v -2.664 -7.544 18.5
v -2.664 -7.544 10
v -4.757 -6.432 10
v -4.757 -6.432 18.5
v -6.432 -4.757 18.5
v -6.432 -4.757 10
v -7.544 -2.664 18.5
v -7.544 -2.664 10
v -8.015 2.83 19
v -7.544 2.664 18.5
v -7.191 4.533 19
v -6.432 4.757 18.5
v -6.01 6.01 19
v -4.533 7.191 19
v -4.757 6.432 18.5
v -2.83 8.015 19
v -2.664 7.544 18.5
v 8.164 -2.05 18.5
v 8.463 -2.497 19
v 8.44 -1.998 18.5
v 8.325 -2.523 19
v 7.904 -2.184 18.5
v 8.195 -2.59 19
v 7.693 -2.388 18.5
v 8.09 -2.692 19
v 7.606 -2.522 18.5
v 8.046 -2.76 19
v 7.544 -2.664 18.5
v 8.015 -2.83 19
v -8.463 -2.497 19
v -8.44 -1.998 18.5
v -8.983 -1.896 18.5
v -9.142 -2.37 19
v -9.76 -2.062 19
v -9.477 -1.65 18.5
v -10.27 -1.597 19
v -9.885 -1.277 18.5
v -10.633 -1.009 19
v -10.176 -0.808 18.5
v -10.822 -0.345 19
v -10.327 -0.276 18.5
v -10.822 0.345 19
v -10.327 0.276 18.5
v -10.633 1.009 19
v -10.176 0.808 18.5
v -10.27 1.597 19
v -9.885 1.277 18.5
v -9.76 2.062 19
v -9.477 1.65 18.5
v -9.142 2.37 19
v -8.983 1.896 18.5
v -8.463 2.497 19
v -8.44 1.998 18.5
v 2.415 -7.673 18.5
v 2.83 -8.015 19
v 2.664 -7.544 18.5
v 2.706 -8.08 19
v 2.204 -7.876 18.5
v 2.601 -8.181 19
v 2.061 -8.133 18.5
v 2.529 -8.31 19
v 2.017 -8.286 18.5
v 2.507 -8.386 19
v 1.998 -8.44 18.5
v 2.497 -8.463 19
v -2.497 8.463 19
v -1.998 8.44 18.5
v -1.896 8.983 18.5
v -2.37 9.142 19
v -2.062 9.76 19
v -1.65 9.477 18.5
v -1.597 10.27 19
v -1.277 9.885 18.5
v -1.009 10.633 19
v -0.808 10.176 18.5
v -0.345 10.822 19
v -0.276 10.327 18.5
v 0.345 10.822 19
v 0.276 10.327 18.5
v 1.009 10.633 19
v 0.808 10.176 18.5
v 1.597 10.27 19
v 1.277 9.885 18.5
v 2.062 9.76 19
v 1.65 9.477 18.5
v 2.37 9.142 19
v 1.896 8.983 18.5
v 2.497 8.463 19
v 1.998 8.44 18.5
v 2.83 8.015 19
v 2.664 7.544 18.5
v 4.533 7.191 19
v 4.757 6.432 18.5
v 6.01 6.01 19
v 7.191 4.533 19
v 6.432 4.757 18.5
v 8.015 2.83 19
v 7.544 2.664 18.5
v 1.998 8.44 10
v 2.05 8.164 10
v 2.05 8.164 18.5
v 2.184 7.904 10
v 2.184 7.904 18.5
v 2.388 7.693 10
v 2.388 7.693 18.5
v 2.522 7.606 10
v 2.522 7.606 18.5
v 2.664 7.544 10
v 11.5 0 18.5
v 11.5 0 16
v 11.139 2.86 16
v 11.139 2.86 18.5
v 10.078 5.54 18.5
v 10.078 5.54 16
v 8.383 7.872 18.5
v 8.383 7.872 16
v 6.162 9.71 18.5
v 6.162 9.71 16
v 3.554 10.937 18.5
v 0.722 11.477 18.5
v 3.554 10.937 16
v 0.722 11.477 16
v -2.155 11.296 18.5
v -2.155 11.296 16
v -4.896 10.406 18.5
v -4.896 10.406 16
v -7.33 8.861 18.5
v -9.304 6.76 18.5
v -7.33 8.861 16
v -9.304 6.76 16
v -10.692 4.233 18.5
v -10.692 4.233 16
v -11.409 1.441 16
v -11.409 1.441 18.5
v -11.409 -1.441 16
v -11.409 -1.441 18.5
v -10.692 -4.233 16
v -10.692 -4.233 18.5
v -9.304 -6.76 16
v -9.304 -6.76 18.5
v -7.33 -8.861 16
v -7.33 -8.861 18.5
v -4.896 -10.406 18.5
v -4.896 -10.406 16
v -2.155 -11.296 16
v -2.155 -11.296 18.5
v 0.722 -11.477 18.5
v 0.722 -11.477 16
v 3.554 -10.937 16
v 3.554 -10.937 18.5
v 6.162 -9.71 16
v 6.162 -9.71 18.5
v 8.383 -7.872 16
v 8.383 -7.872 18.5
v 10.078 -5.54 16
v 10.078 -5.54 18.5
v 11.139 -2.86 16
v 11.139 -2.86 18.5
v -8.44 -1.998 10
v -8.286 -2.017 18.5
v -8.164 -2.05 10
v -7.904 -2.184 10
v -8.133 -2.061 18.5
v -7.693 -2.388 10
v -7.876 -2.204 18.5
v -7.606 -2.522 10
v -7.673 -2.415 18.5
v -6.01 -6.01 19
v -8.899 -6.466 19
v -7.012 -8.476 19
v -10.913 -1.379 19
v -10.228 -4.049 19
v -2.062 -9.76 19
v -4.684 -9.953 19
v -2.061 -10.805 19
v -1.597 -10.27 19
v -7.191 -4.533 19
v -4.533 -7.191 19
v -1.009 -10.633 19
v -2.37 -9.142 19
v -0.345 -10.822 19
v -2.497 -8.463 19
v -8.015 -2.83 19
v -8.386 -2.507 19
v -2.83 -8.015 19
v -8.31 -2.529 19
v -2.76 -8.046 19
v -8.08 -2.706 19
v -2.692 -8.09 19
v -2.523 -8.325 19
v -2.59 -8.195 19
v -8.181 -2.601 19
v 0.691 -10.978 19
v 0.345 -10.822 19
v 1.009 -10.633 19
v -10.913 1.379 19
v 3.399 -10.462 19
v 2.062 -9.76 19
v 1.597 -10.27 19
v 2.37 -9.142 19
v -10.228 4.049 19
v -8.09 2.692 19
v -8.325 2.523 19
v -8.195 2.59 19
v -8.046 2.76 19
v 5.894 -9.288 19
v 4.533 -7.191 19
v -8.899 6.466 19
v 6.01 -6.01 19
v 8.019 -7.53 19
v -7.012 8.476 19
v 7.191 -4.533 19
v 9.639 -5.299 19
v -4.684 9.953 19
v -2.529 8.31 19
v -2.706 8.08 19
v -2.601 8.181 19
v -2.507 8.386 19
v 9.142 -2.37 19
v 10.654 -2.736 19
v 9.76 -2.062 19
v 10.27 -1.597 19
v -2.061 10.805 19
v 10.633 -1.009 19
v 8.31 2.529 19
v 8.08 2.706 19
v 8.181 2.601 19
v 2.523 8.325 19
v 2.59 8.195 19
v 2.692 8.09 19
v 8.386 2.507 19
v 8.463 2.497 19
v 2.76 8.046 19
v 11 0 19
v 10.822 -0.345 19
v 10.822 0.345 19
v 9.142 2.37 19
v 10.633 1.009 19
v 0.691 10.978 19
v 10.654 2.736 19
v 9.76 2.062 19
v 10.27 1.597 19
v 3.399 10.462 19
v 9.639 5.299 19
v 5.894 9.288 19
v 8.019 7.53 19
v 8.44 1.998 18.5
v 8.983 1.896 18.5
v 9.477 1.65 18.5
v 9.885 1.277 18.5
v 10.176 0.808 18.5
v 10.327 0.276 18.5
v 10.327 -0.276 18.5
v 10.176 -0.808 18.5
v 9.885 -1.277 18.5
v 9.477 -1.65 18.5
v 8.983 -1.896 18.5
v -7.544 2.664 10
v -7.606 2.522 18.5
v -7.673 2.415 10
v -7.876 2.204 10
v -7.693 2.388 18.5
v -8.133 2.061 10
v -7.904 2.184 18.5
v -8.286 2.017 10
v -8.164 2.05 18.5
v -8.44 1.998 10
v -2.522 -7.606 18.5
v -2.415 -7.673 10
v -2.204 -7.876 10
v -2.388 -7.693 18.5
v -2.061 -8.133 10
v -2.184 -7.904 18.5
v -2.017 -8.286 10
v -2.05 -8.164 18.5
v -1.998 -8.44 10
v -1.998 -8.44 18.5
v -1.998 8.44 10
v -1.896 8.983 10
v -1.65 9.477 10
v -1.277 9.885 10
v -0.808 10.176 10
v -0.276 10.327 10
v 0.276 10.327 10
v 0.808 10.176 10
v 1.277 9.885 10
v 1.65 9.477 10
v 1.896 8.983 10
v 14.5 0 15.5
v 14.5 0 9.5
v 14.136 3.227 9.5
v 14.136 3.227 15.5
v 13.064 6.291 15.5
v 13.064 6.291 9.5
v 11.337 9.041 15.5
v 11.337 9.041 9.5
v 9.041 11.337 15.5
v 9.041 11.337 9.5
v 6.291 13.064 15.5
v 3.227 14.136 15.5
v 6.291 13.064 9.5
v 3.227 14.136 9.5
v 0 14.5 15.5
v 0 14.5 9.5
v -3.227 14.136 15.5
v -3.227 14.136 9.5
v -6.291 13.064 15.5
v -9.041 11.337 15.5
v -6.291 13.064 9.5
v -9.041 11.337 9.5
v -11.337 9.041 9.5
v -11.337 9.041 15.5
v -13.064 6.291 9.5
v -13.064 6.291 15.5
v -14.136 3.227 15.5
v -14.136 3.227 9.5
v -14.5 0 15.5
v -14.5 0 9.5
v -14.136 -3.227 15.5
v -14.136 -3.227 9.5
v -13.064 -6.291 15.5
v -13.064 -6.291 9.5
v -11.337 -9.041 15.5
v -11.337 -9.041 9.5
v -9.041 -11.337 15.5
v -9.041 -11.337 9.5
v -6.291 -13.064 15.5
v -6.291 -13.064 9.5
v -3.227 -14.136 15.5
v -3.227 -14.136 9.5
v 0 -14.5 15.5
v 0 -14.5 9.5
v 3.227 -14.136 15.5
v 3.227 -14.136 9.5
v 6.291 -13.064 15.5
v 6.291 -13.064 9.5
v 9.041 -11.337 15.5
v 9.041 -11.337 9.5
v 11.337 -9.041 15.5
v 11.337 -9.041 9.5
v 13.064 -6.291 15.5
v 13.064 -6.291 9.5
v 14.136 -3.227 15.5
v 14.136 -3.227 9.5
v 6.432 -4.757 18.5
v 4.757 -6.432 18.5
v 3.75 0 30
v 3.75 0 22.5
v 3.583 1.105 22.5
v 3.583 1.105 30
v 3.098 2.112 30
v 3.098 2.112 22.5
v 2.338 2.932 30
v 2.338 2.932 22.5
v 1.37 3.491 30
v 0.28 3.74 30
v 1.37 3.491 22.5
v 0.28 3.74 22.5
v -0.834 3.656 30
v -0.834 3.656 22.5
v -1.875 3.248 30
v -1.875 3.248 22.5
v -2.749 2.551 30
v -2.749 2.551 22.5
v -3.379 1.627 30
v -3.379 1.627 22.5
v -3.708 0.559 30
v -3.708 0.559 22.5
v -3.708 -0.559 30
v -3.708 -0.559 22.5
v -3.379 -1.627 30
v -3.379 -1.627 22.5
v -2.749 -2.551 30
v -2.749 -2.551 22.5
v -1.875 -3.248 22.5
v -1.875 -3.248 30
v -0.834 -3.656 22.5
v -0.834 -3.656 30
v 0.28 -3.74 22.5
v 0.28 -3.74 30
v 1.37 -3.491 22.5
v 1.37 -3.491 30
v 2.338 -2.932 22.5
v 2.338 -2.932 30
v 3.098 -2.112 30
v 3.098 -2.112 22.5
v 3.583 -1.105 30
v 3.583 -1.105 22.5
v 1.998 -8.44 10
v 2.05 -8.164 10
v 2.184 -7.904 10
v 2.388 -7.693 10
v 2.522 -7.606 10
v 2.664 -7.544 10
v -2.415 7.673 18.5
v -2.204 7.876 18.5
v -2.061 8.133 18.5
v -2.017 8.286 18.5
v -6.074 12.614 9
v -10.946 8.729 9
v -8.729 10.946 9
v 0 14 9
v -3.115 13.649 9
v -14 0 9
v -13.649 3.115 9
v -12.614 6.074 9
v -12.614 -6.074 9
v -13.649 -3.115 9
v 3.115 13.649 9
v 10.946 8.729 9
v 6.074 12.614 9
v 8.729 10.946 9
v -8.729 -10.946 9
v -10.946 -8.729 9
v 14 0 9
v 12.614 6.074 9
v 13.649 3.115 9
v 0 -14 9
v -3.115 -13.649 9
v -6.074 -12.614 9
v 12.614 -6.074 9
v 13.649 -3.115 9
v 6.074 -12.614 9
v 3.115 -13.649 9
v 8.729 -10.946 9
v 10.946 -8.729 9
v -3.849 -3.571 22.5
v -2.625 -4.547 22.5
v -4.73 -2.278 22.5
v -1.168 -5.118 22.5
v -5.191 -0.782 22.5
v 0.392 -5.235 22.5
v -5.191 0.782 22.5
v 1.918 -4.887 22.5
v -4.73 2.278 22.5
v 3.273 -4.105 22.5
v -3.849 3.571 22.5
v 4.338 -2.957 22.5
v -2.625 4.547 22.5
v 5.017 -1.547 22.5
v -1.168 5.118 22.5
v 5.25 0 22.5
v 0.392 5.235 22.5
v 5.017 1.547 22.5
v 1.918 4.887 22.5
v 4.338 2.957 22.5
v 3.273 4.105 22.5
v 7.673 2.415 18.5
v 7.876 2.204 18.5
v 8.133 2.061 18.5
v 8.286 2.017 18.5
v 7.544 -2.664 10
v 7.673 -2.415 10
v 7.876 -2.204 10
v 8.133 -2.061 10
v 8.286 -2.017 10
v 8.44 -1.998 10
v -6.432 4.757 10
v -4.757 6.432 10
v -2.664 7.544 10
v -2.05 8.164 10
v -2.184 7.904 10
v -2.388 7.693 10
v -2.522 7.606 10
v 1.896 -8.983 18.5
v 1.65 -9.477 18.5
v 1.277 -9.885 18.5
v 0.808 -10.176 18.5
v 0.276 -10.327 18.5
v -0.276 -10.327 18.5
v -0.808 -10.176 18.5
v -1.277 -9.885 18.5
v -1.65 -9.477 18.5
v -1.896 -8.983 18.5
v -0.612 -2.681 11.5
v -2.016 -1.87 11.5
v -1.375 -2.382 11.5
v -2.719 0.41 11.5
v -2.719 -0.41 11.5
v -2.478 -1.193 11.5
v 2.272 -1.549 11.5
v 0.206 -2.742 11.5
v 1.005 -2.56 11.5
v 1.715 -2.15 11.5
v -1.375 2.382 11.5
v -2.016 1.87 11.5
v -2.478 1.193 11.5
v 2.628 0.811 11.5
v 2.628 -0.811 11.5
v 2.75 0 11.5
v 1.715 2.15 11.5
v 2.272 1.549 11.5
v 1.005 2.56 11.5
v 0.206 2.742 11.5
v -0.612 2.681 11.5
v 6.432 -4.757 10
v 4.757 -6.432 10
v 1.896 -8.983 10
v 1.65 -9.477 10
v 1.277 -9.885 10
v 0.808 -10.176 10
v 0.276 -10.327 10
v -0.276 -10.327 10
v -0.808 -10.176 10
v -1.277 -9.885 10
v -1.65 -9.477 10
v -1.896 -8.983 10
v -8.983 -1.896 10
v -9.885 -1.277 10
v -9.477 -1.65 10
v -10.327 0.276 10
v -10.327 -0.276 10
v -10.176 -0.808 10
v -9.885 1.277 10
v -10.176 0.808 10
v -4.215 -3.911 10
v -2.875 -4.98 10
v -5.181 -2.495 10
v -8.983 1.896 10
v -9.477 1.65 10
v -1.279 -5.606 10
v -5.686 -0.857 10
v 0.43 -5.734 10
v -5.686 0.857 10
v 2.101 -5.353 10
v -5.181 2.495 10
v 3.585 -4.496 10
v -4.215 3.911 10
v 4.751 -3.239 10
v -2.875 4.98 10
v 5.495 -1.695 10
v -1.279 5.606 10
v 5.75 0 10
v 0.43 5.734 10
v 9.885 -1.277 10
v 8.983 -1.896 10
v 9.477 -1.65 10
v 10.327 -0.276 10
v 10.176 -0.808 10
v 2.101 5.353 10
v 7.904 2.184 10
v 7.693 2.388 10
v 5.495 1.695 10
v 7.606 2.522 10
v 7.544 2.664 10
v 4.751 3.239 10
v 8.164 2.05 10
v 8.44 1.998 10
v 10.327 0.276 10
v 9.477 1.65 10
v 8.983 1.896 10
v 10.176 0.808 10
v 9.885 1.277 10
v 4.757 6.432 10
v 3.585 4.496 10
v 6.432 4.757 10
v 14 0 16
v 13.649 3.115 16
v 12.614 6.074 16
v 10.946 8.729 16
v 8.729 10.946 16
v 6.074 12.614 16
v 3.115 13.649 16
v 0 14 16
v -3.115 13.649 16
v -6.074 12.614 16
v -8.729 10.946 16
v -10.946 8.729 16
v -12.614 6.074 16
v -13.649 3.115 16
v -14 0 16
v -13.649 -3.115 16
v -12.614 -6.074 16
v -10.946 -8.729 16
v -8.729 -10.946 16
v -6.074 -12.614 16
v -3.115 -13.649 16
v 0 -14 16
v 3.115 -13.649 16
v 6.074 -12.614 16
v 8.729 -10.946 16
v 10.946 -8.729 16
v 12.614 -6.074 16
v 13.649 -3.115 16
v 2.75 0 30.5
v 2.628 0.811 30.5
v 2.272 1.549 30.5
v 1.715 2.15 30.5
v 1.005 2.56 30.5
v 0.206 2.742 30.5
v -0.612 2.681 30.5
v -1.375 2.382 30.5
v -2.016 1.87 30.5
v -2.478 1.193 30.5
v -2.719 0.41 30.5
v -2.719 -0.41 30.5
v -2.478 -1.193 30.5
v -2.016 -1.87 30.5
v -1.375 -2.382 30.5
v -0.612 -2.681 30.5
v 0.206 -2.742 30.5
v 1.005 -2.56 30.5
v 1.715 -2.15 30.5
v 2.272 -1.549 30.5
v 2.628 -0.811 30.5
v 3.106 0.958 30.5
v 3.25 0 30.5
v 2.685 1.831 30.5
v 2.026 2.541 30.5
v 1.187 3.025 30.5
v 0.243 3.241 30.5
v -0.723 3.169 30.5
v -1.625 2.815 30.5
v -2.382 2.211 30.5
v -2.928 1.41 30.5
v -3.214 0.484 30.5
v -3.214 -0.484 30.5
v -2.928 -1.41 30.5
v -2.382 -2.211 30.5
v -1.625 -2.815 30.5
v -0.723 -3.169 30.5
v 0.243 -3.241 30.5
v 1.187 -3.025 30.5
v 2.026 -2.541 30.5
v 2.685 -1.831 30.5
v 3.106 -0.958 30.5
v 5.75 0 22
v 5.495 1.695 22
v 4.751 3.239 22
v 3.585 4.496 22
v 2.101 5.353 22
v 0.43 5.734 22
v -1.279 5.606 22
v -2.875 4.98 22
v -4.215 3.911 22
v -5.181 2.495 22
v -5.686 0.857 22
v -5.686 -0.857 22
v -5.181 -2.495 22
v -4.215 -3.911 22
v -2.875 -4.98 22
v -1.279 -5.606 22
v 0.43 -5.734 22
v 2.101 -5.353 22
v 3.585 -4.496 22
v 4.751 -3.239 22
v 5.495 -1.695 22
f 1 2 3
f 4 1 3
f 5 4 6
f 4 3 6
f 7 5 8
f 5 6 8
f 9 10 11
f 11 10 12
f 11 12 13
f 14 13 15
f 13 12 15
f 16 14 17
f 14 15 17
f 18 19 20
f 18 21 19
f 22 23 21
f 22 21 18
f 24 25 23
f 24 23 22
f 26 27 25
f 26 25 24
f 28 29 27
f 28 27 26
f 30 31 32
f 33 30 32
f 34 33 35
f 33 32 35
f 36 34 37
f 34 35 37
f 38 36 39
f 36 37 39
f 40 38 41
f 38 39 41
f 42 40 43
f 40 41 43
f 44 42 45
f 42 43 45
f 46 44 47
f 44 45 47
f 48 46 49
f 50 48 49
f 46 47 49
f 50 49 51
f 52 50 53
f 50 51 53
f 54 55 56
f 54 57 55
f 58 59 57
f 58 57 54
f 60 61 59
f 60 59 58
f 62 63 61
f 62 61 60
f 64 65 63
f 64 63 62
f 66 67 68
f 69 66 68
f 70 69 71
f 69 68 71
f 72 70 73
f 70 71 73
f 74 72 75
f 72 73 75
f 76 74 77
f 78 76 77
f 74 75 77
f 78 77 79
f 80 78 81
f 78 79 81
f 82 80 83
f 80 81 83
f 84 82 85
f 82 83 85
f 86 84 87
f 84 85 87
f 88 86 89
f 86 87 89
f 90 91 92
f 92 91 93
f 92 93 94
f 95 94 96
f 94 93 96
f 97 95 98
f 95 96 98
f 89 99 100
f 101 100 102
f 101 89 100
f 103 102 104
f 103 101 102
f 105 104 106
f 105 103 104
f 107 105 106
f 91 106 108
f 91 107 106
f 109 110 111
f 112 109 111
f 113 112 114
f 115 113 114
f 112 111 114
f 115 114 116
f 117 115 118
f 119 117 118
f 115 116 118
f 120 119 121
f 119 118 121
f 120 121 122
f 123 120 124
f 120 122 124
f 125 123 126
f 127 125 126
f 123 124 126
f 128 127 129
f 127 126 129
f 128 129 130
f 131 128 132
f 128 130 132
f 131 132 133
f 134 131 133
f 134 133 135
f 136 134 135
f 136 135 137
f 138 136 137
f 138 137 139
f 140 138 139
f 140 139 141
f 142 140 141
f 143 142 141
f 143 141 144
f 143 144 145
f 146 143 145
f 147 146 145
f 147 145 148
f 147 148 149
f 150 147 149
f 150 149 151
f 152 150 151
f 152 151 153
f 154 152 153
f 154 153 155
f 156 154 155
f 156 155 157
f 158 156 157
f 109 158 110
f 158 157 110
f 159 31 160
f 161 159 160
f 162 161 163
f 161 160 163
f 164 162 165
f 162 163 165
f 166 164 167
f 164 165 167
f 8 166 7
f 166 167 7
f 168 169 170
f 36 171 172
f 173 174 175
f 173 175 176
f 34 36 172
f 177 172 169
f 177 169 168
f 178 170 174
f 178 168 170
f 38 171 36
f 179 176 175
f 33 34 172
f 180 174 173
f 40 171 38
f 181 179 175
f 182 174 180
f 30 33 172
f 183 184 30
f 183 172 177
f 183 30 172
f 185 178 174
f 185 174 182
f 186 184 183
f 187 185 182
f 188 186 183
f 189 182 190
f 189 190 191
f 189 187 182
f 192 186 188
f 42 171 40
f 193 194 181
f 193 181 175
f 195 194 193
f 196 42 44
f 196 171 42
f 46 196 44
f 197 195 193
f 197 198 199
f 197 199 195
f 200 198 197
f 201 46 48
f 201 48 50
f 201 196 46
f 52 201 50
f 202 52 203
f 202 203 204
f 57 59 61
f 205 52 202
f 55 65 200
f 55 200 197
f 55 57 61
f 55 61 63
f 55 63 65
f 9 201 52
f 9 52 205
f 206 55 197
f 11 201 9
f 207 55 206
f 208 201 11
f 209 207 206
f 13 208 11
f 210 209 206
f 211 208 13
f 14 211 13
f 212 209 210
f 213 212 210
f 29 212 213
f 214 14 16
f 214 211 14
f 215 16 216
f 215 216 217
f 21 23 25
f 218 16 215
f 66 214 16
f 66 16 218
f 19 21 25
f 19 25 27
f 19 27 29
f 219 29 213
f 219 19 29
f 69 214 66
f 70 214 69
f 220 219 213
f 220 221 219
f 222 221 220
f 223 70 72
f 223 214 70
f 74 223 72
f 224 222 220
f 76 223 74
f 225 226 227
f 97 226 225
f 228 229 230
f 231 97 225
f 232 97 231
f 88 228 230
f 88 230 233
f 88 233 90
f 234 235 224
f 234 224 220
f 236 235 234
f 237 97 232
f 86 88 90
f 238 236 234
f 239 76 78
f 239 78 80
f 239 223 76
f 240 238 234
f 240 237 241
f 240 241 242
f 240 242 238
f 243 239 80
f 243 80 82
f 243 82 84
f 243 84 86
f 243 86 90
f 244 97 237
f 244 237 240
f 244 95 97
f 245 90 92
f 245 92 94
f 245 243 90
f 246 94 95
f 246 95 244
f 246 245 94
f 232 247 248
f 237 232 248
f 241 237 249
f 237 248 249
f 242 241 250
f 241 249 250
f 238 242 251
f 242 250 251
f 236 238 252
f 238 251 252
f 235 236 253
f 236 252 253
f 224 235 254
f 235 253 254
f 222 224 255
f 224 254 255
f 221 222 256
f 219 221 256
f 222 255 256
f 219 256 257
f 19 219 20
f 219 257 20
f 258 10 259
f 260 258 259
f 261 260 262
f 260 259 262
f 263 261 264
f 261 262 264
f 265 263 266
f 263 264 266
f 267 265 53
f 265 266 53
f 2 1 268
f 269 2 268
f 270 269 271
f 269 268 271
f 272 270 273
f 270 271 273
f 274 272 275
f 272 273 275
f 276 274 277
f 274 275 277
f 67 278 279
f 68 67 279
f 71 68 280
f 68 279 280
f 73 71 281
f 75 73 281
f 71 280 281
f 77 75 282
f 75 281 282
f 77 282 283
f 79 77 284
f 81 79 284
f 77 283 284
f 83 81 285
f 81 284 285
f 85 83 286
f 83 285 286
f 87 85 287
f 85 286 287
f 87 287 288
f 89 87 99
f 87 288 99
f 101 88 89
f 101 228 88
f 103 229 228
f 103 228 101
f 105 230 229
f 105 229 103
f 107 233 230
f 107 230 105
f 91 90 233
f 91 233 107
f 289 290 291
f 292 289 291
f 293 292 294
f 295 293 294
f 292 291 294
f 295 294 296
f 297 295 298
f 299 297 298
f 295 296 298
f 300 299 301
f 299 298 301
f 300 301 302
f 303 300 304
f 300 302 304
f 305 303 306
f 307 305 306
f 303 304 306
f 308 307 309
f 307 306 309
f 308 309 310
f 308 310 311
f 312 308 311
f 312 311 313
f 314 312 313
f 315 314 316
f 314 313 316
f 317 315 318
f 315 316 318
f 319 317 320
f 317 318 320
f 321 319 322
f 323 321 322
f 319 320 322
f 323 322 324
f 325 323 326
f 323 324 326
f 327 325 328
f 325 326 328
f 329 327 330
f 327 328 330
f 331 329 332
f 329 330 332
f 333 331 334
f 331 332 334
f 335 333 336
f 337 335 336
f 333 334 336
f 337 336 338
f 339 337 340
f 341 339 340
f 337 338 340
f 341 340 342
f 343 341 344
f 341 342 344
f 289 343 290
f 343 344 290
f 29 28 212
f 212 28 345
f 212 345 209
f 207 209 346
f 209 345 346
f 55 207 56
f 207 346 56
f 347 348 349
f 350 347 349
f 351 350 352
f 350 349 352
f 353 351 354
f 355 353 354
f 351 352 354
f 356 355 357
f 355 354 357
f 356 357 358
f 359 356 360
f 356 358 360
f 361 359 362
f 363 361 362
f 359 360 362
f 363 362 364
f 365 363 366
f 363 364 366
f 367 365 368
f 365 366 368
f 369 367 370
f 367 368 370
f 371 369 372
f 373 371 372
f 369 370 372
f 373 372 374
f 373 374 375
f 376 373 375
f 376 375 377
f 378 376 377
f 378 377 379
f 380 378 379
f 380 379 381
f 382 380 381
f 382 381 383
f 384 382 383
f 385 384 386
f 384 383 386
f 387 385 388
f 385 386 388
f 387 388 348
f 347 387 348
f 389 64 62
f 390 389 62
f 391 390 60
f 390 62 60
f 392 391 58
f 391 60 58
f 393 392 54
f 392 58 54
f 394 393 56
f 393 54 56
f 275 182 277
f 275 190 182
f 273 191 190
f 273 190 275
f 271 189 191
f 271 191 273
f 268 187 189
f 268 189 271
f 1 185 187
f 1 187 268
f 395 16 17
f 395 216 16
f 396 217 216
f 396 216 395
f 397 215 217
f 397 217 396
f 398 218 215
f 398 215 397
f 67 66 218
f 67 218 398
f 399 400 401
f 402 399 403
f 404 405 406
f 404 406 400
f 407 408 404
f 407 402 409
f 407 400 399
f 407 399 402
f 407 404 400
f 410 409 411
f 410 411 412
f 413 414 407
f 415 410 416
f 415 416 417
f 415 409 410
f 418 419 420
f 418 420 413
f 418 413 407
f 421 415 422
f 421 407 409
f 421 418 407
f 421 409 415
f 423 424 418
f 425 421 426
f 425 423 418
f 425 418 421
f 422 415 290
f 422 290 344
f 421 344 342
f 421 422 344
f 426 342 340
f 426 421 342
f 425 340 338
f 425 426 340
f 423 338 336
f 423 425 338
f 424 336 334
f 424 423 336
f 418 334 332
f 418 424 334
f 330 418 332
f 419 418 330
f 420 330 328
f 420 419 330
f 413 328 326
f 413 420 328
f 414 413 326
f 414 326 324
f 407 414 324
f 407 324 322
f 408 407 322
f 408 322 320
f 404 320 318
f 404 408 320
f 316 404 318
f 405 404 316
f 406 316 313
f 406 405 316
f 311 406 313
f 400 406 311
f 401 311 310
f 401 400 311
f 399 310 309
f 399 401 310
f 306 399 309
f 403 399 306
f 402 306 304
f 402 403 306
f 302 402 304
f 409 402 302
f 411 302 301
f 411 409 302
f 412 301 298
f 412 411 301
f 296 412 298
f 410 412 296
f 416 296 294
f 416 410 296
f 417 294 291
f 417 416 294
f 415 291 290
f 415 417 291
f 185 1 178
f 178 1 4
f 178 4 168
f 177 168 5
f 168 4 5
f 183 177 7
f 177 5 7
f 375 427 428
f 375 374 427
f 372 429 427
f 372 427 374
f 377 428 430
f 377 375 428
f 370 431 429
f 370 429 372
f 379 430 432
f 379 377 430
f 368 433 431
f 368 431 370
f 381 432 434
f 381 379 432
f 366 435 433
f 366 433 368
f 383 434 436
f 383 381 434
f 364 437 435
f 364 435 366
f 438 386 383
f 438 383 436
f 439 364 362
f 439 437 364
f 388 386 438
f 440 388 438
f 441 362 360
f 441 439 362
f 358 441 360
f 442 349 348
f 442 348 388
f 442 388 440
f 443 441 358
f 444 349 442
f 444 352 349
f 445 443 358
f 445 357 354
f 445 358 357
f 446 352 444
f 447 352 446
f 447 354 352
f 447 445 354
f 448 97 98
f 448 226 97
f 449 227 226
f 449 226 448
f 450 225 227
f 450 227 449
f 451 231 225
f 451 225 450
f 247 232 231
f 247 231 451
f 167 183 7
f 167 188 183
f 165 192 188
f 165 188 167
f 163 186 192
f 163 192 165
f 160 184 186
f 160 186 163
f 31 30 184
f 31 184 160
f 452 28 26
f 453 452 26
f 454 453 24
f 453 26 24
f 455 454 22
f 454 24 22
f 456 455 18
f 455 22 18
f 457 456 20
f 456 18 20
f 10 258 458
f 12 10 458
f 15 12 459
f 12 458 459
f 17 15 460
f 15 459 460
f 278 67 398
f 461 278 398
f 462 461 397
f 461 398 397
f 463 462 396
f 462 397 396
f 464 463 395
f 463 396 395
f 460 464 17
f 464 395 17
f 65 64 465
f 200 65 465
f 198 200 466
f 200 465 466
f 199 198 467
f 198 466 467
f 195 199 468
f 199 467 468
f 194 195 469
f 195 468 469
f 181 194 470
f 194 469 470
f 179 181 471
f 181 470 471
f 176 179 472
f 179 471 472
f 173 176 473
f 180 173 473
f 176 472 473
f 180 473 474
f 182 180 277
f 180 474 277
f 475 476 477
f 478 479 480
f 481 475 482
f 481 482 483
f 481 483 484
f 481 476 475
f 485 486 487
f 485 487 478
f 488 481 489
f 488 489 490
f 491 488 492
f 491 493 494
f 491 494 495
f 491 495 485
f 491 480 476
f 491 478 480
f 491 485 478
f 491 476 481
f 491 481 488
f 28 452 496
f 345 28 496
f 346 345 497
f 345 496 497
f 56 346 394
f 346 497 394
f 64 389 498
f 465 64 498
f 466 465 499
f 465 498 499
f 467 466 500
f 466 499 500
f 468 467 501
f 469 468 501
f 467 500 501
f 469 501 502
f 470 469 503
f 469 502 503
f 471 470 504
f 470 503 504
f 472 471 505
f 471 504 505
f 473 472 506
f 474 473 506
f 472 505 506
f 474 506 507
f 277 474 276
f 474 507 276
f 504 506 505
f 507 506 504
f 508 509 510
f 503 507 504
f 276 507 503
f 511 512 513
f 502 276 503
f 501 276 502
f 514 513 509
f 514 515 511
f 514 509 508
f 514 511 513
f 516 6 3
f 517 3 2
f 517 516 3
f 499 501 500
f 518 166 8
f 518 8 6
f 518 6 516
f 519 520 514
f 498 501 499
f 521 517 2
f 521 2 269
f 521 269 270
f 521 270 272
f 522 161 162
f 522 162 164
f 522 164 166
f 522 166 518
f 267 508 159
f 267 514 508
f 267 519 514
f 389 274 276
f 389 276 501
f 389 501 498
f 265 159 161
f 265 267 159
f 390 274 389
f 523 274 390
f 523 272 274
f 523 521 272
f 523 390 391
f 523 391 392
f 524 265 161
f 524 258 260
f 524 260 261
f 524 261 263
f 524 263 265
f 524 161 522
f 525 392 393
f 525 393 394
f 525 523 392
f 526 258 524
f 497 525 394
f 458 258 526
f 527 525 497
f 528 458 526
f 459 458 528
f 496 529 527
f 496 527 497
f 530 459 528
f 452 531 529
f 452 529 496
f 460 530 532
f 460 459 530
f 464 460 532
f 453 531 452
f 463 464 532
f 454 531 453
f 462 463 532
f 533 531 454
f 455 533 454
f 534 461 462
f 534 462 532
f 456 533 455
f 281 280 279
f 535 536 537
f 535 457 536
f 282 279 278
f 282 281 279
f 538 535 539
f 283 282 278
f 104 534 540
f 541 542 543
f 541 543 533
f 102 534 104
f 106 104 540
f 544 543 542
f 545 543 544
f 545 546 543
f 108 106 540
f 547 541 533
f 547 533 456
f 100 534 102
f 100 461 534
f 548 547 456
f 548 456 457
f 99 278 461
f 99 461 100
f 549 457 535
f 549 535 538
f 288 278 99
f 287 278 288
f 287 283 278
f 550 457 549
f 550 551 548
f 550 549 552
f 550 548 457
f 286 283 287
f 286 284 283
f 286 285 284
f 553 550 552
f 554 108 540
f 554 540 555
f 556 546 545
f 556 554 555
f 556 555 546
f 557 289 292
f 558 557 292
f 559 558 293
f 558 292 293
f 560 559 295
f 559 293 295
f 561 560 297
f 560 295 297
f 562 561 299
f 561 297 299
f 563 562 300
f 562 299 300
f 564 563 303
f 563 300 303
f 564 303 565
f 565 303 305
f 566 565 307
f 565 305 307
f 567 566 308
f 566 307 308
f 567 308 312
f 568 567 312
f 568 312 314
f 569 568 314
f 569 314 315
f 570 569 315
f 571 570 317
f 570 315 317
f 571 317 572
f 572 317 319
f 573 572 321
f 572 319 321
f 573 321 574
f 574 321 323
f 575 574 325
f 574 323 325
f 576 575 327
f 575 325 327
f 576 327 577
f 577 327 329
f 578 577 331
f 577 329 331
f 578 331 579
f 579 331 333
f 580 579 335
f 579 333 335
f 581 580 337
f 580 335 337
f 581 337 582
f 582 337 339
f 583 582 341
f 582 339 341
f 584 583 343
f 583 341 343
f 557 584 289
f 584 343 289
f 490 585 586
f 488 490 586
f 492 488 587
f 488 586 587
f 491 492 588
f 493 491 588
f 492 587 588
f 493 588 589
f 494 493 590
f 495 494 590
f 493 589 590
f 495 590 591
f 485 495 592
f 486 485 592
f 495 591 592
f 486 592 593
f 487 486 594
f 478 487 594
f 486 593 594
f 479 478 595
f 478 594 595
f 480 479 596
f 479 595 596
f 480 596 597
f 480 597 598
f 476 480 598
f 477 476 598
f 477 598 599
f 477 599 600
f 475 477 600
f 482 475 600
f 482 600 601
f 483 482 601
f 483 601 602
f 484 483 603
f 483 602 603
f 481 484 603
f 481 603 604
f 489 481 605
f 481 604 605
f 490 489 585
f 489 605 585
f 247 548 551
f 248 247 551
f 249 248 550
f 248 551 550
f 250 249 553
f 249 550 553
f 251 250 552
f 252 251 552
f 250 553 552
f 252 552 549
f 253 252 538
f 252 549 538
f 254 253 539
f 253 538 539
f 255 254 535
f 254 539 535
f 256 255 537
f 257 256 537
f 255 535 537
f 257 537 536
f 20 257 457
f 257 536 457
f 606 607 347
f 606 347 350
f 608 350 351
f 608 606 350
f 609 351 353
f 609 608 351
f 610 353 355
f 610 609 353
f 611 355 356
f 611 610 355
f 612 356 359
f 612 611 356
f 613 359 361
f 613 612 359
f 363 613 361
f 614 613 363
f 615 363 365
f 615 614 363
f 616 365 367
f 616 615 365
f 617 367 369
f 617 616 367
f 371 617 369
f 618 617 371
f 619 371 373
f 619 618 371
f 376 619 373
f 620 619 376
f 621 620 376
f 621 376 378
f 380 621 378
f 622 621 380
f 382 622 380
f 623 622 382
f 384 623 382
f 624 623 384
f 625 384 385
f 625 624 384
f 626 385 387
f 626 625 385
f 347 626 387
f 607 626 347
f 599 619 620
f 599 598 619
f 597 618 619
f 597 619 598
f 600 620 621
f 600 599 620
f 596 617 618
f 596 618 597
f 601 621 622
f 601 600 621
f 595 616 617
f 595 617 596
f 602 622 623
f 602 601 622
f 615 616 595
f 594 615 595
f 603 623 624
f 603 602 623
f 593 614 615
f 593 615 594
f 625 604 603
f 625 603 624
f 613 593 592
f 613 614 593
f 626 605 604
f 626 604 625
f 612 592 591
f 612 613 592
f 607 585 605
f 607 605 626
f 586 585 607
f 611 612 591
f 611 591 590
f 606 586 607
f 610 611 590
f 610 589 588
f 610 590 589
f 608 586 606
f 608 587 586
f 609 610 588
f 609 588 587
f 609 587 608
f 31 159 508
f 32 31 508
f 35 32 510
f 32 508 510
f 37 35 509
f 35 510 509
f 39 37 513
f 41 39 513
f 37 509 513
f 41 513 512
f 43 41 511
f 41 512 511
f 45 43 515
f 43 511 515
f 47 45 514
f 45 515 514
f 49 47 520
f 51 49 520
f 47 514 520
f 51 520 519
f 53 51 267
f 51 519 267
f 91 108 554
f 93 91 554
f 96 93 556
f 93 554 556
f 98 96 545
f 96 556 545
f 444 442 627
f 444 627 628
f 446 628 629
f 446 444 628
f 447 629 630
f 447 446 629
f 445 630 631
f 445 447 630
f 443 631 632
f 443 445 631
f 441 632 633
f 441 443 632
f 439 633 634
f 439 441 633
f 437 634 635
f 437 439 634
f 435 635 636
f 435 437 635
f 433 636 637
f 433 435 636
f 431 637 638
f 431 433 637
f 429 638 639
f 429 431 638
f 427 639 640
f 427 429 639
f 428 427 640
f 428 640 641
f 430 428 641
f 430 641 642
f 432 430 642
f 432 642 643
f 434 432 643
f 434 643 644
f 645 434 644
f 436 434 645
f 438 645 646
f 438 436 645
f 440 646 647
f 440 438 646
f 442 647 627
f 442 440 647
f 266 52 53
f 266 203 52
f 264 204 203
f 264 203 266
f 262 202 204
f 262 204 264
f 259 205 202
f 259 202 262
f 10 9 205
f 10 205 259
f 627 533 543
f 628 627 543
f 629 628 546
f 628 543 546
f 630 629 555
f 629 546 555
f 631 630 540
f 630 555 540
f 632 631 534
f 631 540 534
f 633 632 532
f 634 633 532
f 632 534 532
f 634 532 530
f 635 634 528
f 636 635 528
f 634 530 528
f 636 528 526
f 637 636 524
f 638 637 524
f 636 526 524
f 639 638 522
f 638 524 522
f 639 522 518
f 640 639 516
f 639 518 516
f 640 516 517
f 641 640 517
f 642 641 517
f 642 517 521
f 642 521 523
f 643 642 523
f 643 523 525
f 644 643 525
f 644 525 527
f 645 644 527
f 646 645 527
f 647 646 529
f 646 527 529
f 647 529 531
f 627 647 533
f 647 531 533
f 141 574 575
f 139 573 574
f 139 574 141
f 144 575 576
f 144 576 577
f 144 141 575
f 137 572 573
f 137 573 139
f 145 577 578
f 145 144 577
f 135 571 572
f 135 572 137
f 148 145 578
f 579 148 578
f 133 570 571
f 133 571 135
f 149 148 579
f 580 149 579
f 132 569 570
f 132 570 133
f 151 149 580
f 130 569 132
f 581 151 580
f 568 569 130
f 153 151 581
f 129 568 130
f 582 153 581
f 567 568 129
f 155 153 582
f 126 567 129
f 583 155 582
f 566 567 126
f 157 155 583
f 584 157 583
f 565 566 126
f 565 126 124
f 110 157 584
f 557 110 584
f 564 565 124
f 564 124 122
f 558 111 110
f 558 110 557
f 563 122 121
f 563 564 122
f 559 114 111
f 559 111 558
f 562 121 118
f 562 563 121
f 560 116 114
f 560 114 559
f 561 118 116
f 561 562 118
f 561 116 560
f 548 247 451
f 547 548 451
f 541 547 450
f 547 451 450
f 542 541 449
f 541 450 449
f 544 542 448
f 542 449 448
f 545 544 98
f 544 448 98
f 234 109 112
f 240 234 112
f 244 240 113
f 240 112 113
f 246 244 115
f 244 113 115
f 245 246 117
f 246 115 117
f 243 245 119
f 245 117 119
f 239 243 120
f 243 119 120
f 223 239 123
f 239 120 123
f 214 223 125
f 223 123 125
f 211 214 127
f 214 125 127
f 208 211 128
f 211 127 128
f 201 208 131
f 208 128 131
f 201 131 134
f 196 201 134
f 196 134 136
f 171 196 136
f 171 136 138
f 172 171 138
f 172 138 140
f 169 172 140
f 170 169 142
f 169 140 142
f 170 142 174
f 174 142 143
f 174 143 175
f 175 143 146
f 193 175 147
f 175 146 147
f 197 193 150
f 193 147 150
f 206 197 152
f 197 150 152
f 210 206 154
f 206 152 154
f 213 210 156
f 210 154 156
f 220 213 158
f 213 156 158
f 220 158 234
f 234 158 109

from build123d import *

# Parameters (mm, degrees)
F0_R      = 14.5
F1_DEPTH  = 10
F2_R      = 11.5
F3_DEPTH  = 9
F4_R      = 14.5
F4_R_2    = 11.5
F5_DEPTH  = 6
F6_R      = 25
F7_DEPTH  = 9
F8_R      = 1
F9_R      = 5.75
F10_DEPTH = 12.5
F11_R     = 3.75
F12_DEPTH = 8
F13_SIZE  = 0.5
F14_R     = 2.75
F15_DEPTH = 19


with BuildPart() as f1:
    # F0 (on Top) → F1 (new body)
    with BuildSketch(Plane.XY):
        Circle(F0_R)
    extrude(amount=F1_DEPTH)

    # F2 (on face) → F3 (join)
    with BuildSketch(Plane.XY.offset(10)):
        Circle(F2_R)
        with BuildLine():
            ThreePointArc((2, 7.7459666924), (5.6568542495, 5.6568542495), (7.7459666924, 2))
            Line((7.7459666924, 2), (8.3459666924, 2))
            ThreePointArc((8.3459666924, 2), (10.3459666924, 0), (8.3459666924, -2))
            Line((8.3459666924, -2), (7.7459666924, -2))
            ThreePointArc((7.7459666924, -2), (5.6568542495, -5.6568542495), (2, -7.7459666924))
            Line((2, -7.7459666924), (2, -8.3459666924))
            ThreePointArc((2, -8.3459666924), (0, -10.3459666924), (-2, -8.3459666924))
            Line((-2, -8.3459666924), (-2, -7.7459666924))
            ThreePointArc((-2, -7.7459666924), (-5.6568542495, -5.6568542495), (-7.7459666924, -2))
            Line((-7.7459666924, -2), (-8.3459666924, -2))
            ThreePointArc((-8.3459666924, -2), (-10.3459666924, 0), (-8.3459666924, 2))
            Line((-8.3459666924, 2), (-7.7459666924, 2))
            ThreePointArc((-7.7459666924, 2), (-5.6568542495, 5.6568542495), (-2, 7.7459666924))
            Line((-2, 7.7459666924), (-2, 8.3459666924))
            ThreePointArc((-2, 8.3459666924), (0, 10.3459666924), (2, 8.3459666924))
            Line((2, 8.3459666924), (2, 7.7459666924))
        make_face(mode=Mode.SUBTRACT)
    extrude(amount=F3_DEPTH)

    # F4 (on face) → F5 (join)
    with BuildSketch(Plane.XY.offset(10)):
        Circle(F4_R)
        Circle(F4_R_2, mode=Mode.SUBTRACT)
    extrude(amount=F5_DEPTH)

    # F6 (on face) → F7 (cut)
    with BuildSketch(Plane(origin=(0, 0, 0), x_dir=(1, 0, 0), z_dir=(0, 0, -1))):
        Circle(F6_R)
    extrude(amount=-F7_DEPTH, mode=Mode.SUBTRACT)

    # F8
    f8_edges = [f1.edges().sort_by_distance(p)[0] for p in [
        (-7.745967, 2, 14.5),
        (-2, 7.745967, 14.5),
        (2, 7.745967, 14.5),
        (7.745967, 2, 14.5),
        (-7.745967, -2, 14.5),
        (7.745967, -2, 14.5),
        (2, -7.745967, 14.5),
        (-2, -7.745967, 14.5),
    ]]
    fillet(f8_edges, radius=F8_R)

    # F9 (on face) → F10 (join)
    with BuildSketch(Plane.XY.offset(10)):
        Circle(F9_R)
    extrude(amount=F10_DEPTH)

    # F11 (on face) → F12 (join)
    with BuildSketch(Plane.XY.offset(22.5)):
        Circle(F11_R)
    extrude(amount=F12_DEPTH)

    # F13
    f13_edges = [f1.edges().sort_by_distance(p)[0] for p in [
        (-10.345967, 0, 19),
        (-7.889975, -2.194073, 19),
        (-7.889975, 2.194073, 19),
        (-5.656854, -5.656854, 19),
        (-5.656854, 5.656854, 19),
        (-2.194073, -7.889975, 19),
        (-2.194073, 7.889975, 19),
        (0, -10.345967, 19),
        (0, 10.345967, 19),
        (2.194073, -7.889975, 19),
        (2.194073, 7.889975, 19),
        (5.656854, -5.656854, 19),
        (5.656854, 5.656854, 19),
        (7.889975, -2.194073, 19),
        (7.889975, 2.194073, 19),
        (10.345967, 0, 19),
        (-11.5, 0, 19),
        (-14.5, 0, 16),
        (-3.75, 0, 30.5),
        (-5.75, 0, 22.5),
        (-14.5, 0, 9),
    ]]
    chamfer(f13_edges, length=F13_SIZE)

    # F14 (on face) → F15 (cut)
    with BuildSketch(Plane.XY.offset(30.5)):
        Circle(F14_R)
    extrude(amount=-F15_DEPTH, mode=Mode.SUBTRACT)


solid = f1.part
